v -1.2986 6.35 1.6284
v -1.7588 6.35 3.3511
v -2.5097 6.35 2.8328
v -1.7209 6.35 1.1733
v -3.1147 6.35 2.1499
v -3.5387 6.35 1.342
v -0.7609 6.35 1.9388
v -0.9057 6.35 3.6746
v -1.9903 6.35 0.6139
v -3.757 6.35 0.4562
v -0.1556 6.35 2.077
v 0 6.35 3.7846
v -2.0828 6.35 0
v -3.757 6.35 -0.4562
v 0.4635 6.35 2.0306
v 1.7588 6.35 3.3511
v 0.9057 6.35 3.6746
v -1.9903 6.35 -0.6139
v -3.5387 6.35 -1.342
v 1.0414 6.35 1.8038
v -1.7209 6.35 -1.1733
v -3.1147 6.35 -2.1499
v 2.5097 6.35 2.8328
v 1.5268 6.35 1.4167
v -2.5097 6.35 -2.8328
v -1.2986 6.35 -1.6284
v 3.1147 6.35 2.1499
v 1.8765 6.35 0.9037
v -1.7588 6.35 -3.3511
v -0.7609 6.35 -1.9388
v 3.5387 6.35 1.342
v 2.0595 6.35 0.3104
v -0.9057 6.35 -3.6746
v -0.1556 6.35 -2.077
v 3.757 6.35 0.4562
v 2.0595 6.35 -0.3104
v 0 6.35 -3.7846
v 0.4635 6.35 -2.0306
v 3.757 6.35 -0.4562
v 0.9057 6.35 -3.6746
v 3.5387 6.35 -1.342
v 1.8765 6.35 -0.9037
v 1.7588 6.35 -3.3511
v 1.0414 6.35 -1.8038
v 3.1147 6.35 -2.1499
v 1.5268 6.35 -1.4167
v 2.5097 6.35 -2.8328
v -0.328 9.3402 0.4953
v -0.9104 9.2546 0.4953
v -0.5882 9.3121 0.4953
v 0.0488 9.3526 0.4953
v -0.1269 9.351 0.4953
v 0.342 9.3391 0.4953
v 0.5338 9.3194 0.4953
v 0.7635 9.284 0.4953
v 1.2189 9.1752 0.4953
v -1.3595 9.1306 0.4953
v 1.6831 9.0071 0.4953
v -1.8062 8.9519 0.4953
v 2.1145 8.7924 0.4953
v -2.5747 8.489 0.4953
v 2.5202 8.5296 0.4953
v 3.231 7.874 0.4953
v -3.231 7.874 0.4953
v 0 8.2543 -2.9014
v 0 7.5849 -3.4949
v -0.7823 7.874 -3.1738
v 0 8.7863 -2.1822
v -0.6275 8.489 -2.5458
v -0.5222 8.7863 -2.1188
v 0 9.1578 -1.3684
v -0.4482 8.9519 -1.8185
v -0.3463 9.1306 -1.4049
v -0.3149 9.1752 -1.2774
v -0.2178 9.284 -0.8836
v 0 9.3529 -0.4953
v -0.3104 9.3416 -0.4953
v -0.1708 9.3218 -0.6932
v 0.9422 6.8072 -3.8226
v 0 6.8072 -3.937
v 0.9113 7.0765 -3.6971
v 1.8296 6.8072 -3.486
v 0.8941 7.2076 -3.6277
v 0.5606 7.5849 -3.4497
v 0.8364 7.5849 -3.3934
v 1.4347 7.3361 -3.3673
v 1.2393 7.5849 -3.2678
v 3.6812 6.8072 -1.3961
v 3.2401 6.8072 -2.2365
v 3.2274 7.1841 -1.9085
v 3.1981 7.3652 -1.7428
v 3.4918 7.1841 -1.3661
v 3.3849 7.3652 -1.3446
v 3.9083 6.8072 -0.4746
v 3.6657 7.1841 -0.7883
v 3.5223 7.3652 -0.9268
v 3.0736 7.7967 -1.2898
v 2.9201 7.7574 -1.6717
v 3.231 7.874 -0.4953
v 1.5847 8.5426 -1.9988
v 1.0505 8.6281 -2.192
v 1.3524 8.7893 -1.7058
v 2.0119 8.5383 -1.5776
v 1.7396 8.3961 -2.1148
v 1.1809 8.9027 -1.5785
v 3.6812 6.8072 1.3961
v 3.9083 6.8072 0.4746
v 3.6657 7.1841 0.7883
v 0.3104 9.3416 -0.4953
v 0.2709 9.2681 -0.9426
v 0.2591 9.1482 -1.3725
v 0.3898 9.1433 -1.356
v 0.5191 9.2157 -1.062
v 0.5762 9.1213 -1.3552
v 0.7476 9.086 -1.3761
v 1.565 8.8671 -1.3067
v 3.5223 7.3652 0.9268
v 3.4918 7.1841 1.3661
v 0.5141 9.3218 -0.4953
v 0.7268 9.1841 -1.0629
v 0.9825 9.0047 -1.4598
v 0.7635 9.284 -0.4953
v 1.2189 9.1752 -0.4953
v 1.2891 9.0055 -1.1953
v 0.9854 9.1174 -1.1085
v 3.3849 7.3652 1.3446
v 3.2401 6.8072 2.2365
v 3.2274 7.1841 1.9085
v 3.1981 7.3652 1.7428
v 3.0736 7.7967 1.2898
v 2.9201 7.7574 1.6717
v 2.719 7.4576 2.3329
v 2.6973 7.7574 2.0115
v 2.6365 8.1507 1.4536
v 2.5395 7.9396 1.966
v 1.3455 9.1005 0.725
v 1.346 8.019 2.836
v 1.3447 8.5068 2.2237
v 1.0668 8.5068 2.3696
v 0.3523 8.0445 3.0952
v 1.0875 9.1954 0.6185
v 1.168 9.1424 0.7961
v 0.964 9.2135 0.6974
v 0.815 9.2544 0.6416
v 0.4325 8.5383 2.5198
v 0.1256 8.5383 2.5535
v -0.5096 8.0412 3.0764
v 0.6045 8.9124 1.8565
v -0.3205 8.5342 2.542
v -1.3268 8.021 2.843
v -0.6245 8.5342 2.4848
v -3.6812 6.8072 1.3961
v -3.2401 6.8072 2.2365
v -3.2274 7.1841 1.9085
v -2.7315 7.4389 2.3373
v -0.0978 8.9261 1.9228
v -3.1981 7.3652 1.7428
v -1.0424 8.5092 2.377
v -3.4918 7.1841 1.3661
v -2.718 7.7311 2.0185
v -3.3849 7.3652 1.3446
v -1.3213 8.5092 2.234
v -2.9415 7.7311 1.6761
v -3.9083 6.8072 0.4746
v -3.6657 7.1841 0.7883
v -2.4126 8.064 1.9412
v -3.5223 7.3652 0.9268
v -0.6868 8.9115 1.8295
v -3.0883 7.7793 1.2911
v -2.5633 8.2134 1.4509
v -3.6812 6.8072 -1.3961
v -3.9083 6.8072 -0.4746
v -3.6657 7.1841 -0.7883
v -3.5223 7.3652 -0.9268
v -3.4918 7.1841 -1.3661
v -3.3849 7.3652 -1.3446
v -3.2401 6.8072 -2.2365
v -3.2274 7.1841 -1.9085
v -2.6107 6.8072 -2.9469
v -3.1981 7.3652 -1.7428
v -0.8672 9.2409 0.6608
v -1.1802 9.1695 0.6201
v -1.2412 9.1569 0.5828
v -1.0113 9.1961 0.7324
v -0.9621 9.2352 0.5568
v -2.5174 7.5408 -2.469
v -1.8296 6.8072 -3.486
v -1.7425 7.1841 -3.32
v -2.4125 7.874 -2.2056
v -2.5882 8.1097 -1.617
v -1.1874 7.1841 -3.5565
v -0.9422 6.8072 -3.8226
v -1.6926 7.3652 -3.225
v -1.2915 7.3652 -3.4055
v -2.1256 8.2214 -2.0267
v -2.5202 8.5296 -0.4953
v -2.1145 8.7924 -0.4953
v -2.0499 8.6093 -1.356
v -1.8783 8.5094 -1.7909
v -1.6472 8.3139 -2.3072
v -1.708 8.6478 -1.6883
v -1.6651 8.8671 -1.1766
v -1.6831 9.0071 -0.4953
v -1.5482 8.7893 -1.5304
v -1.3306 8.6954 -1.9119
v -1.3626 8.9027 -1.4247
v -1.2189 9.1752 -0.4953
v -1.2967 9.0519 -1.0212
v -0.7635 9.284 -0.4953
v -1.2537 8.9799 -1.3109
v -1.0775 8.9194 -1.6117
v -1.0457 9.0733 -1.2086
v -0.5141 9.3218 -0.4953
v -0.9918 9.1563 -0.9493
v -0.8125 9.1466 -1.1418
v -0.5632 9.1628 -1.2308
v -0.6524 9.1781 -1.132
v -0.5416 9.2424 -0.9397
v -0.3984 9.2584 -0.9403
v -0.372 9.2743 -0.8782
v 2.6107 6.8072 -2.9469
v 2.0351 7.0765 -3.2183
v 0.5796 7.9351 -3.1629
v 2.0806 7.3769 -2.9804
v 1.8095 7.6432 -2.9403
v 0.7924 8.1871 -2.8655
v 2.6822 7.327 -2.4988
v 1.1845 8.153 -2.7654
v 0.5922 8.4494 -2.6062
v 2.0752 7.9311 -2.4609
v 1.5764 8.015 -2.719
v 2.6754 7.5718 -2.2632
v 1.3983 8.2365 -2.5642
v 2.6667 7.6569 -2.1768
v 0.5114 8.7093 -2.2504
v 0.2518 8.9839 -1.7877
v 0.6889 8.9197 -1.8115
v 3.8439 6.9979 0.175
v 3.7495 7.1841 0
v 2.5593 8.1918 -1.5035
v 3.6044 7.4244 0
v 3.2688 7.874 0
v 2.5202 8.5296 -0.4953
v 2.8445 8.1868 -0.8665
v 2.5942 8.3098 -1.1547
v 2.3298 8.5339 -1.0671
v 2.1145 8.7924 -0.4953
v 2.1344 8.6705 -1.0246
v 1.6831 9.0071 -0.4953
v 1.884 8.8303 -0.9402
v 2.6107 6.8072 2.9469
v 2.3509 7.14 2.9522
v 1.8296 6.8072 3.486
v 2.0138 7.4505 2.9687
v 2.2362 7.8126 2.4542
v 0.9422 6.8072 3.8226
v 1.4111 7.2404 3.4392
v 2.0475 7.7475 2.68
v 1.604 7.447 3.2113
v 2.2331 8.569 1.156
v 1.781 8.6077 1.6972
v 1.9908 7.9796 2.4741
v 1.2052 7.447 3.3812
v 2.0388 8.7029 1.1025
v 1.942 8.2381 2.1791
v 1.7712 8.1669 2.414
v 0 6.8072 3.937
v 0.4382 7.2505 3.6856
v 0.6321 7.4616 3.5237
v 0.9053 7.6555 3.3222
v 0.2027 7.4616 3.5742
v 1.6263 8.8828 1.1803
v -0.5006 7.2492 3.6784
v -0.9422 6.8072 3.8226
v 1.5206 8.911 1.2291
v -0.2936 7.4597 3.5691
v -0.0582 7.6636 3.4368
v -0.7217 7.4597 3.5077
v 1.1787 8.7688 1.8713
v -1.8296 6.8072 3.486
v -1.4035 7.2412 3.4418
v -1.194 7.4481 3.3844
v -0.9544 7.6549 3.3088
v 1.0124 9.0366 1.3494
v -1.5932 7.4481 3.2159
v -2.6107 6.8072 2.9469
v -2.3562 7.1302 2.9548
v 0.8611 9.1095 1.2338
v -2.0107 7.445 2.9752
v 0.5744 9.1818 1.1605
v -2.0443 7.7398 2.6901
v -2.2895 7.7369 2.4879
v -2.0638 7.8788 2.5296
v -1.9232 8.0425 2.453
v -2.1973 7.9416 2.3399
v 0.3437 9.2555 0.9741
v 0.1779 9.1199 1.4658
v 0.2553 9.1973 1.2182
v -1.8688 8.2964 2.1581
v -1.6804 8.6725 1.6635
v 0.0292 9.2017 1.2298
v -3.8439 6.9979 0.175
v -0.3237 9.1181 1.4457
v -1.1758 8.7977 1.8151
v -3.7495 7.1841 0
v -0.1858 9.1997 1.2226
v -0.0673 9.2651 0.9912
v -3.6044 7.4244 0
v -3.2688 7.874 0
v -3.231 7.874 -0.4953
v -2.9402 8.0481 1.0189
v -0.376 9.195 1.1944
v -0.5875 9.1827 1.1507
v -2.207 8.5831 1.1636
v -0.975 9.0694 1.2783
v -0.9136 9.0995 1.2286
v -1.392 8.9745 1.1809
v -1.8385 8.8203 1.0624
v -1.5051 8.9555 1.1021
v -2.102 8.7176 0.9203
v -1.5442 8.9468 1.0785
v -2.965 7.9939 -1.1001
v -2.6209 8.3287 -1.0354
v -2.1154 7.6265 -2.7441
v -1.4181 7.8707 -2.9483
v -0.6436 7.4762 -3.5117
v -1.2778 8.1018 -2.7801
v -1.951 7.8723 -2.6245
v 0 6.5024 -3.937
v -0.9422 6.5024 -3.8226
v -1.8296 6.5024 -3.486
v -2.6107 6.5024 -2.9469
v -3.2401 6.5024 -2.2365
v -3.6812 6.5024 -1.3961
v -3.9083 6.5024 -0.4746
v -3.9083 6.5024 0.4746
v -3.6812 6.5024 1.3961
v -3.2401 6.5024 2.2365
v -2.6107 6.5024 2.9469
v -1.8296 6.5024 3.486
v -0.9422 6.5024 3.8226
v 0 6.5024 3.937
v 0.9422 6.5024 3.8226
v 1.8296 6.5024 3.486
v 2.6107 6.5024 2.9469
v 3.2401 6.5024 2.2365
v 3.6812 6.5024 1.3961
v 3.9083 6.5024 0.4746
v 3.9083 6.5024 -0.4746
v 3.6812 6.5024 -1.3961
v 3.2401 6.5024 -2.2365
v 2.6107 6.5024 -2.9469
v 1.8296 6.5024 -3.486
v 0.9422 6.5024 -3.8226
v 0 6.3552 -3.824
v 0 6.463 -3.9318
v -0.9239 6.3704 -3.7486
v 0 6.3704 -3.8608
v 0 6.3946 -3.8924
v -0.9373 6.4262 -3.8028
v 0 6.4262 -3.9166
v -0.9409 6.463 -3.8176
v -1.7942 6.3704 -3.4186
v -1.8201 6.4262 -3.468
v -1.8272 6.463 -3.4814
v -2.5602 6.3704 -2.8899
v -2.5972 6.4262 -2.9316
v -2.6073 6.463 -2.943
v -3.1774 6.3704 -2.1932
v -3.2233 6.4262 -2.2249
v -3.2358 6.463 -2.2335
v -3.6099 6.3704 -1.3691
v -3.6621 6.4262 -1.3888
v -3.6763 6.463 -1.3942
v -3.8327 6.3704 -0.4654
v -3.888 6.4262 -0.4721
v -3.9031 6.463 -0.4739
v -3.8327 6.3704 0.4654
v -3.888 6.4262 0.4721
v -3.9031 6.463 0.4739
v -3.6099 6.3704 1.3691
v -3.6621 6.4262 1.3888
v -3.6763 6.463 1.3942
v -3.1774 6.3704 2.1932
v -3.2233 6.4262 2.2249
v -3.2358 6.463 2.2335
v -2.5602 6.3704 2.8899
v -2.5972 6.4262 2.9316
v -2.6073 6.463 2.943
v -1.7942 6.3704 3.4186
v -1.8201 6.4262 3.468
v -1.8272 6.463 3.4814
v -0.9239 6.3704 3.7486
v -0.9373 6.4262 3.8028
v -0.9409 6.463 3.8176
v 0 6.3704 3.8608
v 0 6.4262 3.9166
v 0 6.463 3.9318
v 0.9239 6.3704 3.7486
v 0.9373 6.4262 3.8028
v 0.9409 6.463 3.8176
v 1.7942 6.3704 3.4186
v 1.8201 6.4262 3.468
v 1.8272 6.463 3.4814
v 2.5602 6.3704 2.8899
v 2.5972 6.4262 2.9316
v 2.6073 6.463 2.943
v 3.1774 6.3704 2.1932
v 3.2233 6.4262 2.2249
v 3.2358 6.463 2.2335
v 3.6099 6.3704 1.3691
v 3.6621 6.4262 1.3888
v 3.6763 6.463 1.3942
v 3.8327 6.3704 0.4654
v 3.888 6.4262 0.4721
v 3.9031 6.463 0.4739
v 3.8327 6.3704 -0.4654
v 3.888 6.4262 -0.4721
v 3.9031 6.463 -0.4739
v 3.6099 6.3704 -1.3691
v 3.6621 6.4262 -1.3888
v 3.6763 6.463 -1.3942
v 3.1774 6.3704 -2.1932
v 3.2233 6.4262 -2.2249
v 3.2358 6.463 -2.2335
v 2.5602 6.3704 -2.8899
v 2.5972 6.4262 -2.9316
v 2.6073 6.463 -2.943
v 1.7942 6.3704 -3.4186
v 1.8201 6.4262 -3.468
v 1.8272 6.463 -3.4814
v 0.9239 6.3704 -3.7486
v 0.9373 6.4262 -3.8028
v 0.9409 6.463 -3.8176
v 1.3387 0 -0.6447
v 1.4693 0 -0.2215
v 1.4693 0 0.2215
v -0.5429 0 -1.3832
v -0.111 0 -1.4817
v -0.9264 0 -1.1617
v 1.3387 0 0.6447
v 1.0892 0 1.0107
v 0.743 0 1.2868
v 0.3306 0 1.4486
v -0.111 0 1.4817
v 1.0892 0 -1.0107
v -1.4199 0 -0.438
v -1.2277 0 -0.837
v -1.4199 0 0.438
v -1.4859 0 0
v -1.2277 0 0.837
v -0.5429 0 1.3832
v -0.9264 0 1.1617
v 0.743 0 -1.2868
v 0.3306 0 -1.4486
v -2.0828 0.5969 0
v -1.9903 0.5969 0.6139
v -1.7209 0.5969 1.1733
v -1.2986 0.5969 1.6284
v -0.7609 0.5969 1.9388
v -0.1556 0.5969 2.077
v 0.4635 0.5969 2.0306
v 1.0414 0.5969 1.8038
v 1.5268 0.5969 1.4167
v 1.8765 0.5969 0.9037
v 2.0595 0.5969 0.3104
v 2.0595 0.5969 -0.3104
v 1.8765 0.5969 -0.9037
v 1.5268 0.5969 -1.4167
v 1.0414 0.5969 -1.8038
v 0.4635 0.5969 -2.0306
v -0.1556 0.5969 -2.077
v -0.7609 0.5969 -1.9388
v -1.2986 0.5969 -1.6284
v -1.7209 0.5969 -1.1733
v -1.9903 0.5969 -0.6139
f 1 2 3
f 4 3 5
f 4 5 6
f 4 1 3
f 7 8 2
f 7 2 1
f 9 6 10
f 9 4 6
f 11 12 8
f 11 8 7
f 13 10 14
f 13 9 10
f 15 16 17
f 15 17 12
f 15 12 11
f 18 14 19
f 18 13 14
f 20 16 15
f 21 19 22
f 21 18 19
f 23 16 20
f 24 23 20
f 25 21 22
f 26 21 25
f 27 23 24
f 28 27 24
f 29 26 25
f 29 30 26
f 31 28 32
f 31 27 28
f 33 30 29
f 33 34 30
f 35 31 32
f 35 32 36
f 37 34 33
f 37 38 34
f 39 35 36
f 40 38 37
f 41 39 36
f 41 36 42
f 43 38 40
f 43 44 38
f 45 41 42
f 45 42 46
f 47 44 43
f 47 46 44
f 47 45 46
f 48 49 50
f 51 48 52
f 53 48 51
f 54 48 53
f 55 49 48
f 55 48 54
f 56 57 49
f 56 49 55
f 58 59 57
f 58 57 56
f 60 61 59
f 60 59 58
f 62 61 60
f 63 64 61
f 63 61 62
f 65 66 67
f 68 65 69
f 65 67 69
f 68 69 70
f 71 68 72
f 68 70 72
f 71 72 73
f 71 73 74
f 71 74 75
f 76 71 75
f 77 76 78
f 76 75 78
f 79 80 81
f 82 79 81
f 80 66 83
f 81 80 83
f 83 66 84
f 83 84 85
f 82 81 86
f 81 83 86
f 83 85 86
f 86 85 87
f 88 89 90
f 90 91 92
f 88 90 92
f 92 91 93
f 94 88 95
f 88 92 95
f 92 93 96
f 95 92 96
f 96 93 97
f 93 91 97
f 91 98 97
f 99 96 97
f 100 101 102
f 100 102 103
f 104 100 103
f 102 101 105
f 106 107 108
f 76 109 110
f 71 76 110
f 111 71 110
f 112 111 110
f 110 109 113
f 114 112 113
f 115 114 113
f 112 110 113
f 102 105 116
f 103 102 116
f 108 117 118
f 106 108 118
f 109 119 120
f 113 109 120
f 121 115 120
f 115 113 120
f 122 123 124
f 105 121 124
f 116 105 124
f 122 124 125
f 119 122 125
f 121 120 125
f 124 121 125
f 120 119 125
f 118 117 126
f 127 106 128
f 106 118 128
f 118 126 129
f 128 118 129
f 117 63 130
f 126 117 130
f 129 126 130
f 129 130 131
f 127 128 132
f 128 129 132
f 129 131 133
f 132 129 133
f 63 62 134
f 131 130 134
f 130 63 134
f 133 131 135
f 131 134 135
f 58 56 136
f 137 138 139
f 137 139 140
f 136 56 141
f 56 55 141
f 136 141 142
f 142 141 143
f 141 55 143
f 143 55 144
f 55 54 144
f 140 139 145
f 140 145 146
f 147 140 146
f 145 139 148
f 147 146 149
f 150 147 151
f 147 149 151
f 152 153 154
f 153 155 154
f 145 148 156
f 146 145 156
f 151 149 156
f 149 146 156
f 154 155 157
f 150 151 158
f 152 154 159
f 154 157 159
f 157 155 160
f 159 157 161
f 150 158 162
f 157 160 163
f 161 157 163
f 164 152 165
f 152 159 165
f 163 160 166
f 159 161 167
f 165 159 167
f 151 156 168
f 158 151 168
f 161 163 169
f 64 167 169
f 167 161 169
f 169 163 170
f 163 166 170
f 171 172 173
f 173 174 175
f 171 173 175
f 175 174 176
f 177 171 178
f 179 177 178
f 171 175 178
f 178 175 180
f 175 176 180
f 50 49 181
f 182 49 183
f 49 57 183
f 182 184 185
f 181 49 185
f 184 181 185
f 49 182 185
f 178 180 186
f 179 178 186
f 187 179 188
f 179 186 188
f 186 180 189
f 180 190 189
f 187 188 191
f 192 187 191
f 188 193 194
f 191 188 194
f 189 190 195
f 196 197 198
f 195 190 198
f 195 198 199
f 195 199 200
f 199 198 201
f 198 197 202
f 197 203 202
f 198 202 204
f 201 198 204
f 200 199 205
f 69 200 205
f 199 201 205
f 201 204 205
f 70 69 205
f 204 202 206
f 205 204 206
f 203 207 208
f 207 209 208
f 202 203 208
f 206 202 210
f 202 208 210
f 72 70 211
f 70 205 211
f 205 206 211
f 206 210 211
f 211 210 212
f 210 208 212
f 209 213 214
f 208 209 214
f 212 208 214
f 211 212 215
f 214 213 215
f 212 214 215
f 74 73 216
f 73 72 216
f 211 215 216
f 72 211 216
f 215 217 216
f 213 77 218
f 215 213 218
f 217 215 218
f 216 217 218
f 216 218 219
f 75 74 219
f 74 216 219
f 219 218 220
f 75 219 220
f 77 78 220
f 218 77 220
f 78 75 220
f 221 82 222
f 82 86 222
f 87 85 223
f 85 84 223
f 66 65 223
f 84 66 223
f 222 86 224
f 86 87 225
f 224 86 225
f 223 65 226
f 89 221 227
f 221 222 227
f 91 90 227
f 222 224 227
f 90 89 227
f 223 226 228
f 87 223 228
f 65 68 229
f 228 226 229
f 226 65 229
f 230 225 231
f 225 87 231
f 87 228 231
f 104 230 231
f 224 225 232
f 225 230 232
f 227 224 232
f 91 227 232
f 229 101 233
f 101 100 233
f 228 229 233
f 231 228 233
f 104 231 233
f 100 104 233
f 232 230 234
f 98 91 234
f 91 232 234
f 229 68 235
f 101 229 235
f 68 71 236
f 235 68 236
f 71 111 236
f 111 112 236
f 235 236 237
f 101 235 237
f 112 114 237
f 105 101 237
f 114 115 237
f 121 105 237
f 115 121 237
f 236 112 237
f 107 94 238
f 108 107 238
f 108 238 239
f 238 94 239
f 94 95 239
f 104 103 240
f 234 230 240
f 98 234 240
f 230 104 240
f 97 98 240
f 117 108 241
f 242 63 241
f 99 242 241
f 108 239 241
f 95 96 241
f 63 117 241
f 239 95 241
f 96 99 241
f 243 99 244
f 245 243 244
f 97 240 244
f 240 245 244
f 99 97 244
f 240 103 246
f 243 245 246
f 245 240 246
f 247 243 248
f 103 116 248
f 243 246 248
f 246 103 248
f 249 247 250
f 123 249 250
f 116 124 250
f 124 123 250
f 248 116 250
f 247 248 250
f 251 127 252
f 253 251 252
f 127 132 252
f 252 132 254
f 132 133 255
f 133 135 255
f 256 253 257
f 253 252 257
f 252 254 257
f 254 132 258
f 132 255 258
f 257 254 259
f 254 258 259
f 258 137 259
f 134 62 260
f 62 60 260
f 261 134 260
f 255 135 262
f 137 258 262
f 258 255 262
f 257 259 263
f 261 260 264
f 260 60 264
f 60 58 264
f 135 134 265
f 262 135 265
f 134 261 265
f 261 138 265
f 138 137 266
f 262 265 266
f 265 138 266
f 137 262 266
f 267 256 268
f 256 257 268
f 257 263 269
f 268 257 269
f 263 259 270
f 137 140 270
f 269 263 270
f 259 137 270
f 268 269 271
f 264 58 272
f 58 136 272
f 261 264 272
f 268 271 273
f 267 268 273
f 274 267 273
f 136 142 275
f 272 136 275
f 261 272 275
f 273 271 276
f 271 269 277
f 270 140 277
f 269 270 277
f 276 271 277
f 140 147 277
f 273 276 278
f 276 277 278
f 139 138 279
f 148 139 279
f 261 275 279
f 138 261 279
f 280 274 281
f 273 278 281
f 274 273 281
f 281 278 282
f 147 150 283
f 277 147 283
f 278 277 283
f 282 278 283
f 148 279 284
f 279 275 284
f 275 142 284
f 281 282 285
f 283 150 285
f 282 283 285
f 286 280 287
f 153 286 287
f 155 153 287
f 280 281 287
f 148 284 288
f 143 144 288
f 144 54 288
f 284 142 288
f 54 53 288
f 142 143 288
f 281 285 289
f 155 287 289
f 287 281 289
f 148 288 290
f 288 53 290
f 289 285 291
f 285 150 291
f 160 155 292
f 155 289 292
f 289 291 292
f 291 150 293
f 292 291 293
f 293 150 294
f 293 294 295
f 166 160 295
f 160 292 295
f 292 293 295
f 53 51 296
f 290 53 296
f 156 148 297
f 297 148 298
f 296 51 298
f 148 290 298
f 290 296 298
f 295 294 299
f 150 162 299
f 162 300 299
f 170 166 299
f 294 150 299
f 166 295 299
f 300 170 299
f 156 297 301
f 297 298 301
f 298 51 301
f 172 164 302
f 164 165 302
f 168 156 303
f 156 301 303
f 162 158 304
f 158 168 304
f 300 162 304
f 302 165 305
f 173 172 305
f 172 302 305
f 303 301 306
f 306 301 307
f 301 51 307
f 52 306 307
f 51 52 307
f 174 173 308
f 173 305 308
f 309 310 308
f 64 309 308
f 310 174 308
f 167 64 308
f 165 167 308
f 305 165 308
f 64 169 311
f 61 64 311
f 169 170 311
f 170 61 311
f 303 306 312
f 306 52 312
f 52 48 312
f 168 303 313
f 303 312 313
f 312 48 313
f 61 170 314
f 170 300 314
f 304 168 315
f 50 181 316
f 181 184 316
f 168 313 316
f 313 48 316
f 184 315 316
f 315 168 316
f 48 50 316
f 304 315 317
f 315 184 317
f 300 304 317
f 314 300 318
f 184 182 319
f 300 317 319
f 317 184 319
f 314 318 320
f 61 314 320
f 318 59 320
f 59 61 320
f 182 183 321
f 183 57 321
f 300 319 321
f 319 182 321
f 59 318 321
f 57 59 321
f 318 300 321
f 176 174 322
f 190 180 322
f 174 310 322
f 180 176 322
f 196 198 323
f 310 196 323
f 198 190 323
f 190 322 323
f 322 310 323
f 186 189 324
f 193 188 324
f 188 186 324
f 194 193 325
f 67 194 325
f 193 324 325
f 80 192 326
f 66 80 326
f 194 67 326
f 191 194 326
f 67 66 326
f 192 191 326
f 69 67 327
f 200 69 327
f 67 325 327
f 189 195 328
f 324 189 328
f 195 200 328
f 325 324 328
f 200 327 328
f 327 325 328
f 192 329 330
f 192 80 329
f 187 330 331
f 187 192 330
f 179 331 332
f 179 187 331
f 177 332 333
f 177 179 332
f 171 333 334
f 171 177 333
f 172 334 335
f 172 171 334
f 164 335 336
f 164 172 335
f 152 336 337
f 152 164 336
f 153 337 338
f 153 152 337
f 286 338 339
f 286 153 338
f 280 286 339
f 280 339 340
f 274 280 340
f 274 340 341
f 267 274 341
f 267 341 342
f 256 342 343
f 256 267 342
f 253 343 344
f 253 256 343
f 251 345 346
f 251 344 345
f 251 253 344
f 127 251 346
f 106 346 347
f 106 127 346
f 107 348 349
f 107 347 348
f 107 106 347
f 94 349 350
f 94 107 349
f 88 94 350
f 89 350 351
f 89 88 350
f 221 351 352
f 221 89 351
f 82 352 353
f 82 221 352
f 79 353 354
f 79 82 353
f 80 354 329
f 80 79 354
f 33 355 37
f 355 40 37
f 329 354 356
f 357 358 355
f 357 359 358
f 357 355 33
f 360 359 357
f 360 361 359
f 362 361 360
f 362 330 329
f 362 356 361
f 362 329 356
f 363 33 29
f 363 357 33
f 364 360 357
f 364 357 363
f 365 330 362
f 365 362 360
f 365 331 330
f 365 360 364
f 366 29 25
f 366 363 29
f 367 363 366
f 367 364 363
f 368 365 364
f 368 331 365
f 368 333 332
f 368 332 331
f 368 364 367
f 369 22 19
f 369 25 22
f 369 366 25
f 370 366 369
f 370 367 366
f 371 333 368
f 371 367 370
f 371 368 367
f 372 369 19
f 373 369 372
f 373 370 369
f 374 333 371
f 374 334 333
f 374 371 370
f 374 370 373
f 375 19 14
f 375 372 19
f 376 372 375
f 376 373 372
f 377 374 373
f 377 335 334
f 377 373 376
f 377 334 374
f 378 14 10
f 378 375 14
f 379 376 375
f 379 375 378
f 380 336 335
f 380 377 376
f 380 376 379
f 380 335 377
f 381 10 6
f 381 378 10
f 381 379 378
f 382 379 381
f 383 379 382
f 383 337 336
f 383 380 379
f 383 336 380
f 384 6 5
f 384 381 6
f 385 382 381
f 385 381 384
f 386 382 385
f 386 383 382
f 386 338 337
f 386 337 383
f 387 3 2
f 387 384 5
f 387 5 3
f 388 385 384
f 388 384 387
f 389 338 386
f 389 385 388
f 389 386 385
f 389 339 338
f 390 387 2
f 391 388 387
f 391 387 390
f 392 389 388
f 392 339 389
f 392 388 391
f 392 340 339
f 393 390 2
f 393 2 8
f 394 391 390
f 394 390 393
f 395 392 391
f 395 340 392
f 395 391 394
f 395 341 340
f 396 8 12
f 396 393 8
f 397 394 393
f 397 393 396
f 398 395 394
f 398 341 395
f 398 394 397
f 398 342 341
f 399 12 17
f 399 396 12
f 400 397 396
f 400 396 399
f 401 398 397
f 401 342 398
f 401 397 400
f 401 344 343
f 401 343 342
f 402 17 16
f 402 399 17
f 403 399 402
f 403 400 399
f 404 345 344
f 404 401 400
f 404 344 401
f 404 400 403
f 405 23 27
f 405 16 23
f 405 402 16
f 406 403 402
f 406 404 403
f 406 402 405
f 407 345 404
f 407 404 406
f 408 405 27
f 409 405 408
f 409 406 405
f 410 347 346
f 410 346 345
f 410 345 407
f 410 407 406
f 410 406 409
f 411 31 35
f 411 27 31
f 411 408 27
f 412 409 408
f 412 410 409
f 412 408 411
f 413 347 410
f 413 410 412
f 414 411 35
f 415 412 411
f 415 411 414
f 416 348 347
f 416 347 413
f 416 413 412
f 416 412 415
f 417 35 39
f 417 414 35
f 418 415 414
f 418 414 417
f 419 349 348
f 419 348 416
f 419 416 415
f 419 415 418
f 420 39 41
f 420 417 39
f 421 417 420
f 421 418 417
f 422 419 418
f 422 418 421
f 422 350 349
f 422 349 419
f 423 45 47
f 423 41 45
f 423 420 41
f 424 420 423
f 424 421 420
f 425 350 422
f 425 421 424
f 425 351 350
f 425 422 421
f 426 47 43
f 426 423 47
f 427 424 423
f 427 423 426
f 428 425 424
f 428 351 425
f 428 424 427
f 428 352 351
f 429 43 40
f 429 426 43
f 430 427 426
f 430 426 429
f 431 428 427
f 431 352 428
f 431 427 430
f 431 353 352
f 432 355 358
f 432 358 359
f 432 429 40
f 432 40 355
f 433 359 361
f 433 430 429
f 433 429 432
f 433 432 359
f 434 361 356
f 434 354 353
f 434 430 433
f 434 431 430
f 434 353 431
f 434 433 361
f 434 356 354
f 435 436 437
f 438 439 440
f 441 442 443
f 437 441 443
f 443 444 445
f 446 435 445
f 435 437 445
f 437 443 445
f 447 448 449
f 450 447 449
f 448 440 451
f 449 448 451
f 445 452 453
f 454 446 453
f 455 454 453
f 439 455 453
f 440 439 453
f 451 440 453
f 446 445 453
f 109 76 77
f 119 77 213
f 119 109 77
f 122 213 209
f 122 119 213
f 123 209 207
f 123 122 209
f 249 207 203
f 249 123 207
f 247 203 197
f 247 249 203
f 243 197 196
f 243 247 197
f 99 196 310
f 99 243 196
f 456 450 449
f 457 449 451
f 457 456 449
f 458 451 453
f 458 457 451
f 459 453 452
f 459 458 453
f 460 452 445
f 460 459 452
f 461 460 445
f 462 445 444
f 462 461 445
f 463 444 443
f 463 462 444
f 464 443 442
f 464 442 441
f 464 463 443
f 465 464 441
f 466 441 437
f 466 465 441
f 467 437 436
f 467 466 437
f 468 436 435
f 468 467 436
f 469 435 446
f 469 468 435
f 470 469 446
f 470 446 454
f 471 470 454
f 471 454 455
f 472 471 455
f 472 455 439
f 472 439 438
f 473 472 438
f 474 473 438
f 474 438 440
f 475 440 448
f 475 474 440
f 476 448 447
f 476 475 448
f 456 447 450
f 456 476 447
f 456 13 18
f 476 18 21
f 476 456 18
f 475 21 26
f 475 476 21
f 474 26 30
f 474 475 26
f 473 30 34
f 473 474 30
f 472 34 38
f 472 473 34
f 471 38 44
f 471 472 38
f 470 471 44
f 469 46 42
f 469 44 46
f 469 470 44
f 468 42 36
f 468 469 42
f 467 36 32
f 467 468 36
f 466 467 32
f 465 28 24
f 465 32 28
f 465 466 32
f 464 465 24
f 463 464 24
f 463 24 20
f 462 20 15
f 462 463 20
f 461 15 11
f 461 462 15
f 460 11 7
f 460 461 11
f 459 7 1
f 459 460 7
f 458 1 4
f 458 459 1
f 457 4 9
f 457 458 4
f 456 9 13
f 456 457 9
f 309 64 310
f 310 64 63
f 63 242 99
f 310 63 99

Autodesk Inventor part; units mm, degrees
ref_plane "YZ Plane" through (0, 0, 0) normal (1, 0, 0) x (0, 1, 0)
ref_plane "XZ Plane" through (0, 0, 0) normal (0, 1, 0) x (-1, 0, 0)
ref_plane "XY Plane" through (0, 0, 0) normal (0, 0, 1) x (1, 0, 0)
sketch "Sketch1" plane through (0, 0, 0) normal (0, 1, 0) x (-1, 0, 0)
  circle A0 centre (0, 0) radius 2.0828
  dimension "d4" = 4.1656
extrude "Body" add sketch "Sketch1" along normal blind 6.35
sketch "Sketch2" plane through (0, 0, 0) normal (1, 0, 0) x (0, 1, 0)
  line L0 (6.35, -2.0828) -> (6.35, 2.0828) projected
  line L1 (6.35, 0) -> (6.35, -3.7846)
  line L2 (6.8072, 0) -> (6.35, 0)
  line L3 (6.8072, 0) -> (6.8072, -3.937)
  arc A0 (6.8072, -3.937) -> (9.3815, 0) centre (5.0838, 0) ccw
  line L4 (6.5024, -3.937) -> (6.8072, -3.937)
  line L5 (6.8072, 0) -> (9.3815, 0)
  arc A1 (6.35, -3.7846) -> (6.5024, -3.937) centre (6.5024, -3.7846) ccw
  point P0 (0, 0)
  point P1 (6.35, -3.937)
  dimension "d5" = 3.937
  dimension "d13" = 0.4572
  dimension "d57" = 3.937
  dimension "d58" = 4.2977
  dimension "d59" = 0
  dimension "d67" = 0.1524
revolve "Head" add sketch "Sketch2" angle 360 about axis through (0, 6.8072, 0) along (0, -1, 0)
feature "Thread" [suppressed]
sketch "Sketch6" plane through (0, 0, 0) normal (0, 0, 1) x (1, 0, 0)
  line L0 (0, 0) -> (-1.4859, 0)
  line L1 (2.0828, 0) -> (-2.0828, 0) projected
  line L2 (-1.4859, 0) -> (-2.4948, 1.0089)
  line L3 (-2.4948, 1.0089) -> (-2.9651, -1.2188)
  line L4 (-2.9651, -1.2188) -> (-1.4859, -1.2188)
  line L5 (-2.0828, 0) -> (-2.0828, 6.35) projected
  line L6 (-1.4859, -1.2188) -> (-1.4859, 0)
  line L7 (0, -2.9358) -> (0, 9.083) projected
  point P0 (-2.0828, 0.5969)
  dimension "d49" = 1.4859
  dimension "d50" = 135
revolve "Tapered End" cut sketch "Sketch6" angle 360 about axis through (0, -10, 0) along (0, 1, 0)
sketch "Sketch7" plane through (0, 0, 0) normal (1, 0, 0) x (0, 1, 0)
  line L0 (31.75, 4.3688) -> (31.75, -4.3688) projected
  line L1 (7.874, 0.4953) -> (7.874, -0.4953)
  line L2 (7.874, 0.4953) -> (9.8806, 0.4953)
  line L3 (9.8806, 0.4953) -> (9.8806, -0.4953)
  line L4 (9.8806, -0.4953) -> (7.874, -0.4953)
  point P0 (0, 0)
  dimension "d61" = 0.9906
  dimension "d62" = 0.4953
  dimension "d65" = 7.874
  dimension "d66" = 2.0066
extrude "Flathead" cut sketch "Sketch7" against normal mid plane 12.7
sketch "Sketch5" plane through (0, 0, 0) normal (1, 0, 0) x (0, 1, 0)
  line L0 (0.0745, -1.5621) -> (-0.2261, -2.0828)
  line L1 (-0.2261, -2.0828) -> (-0.3253, -2.0828)
  line L2 (-0.3253, -2.0828) -> (-0.626, -1.5621)
  line L3 (0.0686, -2.0828) -> (-0.7252, -2.0828) construction
  line L4 (-0.626, -1.5621) -> (0.0745, -1.5621)
  line L5 (0, -1.5621) -> (31.75, -1.5621)
  point P0 (0, 0)
  dimension "d32" = 60
  dimension "a" = 0.0992
  dimension "d46" = 0.7937
  dimension "d54" = 0.0686
  dimension "d55" = 0.5207
  dimension "d56" = 0.0992
equation "\"d56\" = a"
properties part number "AScrew .250" material "VEX Aluminum Alloy 5052-H32"
